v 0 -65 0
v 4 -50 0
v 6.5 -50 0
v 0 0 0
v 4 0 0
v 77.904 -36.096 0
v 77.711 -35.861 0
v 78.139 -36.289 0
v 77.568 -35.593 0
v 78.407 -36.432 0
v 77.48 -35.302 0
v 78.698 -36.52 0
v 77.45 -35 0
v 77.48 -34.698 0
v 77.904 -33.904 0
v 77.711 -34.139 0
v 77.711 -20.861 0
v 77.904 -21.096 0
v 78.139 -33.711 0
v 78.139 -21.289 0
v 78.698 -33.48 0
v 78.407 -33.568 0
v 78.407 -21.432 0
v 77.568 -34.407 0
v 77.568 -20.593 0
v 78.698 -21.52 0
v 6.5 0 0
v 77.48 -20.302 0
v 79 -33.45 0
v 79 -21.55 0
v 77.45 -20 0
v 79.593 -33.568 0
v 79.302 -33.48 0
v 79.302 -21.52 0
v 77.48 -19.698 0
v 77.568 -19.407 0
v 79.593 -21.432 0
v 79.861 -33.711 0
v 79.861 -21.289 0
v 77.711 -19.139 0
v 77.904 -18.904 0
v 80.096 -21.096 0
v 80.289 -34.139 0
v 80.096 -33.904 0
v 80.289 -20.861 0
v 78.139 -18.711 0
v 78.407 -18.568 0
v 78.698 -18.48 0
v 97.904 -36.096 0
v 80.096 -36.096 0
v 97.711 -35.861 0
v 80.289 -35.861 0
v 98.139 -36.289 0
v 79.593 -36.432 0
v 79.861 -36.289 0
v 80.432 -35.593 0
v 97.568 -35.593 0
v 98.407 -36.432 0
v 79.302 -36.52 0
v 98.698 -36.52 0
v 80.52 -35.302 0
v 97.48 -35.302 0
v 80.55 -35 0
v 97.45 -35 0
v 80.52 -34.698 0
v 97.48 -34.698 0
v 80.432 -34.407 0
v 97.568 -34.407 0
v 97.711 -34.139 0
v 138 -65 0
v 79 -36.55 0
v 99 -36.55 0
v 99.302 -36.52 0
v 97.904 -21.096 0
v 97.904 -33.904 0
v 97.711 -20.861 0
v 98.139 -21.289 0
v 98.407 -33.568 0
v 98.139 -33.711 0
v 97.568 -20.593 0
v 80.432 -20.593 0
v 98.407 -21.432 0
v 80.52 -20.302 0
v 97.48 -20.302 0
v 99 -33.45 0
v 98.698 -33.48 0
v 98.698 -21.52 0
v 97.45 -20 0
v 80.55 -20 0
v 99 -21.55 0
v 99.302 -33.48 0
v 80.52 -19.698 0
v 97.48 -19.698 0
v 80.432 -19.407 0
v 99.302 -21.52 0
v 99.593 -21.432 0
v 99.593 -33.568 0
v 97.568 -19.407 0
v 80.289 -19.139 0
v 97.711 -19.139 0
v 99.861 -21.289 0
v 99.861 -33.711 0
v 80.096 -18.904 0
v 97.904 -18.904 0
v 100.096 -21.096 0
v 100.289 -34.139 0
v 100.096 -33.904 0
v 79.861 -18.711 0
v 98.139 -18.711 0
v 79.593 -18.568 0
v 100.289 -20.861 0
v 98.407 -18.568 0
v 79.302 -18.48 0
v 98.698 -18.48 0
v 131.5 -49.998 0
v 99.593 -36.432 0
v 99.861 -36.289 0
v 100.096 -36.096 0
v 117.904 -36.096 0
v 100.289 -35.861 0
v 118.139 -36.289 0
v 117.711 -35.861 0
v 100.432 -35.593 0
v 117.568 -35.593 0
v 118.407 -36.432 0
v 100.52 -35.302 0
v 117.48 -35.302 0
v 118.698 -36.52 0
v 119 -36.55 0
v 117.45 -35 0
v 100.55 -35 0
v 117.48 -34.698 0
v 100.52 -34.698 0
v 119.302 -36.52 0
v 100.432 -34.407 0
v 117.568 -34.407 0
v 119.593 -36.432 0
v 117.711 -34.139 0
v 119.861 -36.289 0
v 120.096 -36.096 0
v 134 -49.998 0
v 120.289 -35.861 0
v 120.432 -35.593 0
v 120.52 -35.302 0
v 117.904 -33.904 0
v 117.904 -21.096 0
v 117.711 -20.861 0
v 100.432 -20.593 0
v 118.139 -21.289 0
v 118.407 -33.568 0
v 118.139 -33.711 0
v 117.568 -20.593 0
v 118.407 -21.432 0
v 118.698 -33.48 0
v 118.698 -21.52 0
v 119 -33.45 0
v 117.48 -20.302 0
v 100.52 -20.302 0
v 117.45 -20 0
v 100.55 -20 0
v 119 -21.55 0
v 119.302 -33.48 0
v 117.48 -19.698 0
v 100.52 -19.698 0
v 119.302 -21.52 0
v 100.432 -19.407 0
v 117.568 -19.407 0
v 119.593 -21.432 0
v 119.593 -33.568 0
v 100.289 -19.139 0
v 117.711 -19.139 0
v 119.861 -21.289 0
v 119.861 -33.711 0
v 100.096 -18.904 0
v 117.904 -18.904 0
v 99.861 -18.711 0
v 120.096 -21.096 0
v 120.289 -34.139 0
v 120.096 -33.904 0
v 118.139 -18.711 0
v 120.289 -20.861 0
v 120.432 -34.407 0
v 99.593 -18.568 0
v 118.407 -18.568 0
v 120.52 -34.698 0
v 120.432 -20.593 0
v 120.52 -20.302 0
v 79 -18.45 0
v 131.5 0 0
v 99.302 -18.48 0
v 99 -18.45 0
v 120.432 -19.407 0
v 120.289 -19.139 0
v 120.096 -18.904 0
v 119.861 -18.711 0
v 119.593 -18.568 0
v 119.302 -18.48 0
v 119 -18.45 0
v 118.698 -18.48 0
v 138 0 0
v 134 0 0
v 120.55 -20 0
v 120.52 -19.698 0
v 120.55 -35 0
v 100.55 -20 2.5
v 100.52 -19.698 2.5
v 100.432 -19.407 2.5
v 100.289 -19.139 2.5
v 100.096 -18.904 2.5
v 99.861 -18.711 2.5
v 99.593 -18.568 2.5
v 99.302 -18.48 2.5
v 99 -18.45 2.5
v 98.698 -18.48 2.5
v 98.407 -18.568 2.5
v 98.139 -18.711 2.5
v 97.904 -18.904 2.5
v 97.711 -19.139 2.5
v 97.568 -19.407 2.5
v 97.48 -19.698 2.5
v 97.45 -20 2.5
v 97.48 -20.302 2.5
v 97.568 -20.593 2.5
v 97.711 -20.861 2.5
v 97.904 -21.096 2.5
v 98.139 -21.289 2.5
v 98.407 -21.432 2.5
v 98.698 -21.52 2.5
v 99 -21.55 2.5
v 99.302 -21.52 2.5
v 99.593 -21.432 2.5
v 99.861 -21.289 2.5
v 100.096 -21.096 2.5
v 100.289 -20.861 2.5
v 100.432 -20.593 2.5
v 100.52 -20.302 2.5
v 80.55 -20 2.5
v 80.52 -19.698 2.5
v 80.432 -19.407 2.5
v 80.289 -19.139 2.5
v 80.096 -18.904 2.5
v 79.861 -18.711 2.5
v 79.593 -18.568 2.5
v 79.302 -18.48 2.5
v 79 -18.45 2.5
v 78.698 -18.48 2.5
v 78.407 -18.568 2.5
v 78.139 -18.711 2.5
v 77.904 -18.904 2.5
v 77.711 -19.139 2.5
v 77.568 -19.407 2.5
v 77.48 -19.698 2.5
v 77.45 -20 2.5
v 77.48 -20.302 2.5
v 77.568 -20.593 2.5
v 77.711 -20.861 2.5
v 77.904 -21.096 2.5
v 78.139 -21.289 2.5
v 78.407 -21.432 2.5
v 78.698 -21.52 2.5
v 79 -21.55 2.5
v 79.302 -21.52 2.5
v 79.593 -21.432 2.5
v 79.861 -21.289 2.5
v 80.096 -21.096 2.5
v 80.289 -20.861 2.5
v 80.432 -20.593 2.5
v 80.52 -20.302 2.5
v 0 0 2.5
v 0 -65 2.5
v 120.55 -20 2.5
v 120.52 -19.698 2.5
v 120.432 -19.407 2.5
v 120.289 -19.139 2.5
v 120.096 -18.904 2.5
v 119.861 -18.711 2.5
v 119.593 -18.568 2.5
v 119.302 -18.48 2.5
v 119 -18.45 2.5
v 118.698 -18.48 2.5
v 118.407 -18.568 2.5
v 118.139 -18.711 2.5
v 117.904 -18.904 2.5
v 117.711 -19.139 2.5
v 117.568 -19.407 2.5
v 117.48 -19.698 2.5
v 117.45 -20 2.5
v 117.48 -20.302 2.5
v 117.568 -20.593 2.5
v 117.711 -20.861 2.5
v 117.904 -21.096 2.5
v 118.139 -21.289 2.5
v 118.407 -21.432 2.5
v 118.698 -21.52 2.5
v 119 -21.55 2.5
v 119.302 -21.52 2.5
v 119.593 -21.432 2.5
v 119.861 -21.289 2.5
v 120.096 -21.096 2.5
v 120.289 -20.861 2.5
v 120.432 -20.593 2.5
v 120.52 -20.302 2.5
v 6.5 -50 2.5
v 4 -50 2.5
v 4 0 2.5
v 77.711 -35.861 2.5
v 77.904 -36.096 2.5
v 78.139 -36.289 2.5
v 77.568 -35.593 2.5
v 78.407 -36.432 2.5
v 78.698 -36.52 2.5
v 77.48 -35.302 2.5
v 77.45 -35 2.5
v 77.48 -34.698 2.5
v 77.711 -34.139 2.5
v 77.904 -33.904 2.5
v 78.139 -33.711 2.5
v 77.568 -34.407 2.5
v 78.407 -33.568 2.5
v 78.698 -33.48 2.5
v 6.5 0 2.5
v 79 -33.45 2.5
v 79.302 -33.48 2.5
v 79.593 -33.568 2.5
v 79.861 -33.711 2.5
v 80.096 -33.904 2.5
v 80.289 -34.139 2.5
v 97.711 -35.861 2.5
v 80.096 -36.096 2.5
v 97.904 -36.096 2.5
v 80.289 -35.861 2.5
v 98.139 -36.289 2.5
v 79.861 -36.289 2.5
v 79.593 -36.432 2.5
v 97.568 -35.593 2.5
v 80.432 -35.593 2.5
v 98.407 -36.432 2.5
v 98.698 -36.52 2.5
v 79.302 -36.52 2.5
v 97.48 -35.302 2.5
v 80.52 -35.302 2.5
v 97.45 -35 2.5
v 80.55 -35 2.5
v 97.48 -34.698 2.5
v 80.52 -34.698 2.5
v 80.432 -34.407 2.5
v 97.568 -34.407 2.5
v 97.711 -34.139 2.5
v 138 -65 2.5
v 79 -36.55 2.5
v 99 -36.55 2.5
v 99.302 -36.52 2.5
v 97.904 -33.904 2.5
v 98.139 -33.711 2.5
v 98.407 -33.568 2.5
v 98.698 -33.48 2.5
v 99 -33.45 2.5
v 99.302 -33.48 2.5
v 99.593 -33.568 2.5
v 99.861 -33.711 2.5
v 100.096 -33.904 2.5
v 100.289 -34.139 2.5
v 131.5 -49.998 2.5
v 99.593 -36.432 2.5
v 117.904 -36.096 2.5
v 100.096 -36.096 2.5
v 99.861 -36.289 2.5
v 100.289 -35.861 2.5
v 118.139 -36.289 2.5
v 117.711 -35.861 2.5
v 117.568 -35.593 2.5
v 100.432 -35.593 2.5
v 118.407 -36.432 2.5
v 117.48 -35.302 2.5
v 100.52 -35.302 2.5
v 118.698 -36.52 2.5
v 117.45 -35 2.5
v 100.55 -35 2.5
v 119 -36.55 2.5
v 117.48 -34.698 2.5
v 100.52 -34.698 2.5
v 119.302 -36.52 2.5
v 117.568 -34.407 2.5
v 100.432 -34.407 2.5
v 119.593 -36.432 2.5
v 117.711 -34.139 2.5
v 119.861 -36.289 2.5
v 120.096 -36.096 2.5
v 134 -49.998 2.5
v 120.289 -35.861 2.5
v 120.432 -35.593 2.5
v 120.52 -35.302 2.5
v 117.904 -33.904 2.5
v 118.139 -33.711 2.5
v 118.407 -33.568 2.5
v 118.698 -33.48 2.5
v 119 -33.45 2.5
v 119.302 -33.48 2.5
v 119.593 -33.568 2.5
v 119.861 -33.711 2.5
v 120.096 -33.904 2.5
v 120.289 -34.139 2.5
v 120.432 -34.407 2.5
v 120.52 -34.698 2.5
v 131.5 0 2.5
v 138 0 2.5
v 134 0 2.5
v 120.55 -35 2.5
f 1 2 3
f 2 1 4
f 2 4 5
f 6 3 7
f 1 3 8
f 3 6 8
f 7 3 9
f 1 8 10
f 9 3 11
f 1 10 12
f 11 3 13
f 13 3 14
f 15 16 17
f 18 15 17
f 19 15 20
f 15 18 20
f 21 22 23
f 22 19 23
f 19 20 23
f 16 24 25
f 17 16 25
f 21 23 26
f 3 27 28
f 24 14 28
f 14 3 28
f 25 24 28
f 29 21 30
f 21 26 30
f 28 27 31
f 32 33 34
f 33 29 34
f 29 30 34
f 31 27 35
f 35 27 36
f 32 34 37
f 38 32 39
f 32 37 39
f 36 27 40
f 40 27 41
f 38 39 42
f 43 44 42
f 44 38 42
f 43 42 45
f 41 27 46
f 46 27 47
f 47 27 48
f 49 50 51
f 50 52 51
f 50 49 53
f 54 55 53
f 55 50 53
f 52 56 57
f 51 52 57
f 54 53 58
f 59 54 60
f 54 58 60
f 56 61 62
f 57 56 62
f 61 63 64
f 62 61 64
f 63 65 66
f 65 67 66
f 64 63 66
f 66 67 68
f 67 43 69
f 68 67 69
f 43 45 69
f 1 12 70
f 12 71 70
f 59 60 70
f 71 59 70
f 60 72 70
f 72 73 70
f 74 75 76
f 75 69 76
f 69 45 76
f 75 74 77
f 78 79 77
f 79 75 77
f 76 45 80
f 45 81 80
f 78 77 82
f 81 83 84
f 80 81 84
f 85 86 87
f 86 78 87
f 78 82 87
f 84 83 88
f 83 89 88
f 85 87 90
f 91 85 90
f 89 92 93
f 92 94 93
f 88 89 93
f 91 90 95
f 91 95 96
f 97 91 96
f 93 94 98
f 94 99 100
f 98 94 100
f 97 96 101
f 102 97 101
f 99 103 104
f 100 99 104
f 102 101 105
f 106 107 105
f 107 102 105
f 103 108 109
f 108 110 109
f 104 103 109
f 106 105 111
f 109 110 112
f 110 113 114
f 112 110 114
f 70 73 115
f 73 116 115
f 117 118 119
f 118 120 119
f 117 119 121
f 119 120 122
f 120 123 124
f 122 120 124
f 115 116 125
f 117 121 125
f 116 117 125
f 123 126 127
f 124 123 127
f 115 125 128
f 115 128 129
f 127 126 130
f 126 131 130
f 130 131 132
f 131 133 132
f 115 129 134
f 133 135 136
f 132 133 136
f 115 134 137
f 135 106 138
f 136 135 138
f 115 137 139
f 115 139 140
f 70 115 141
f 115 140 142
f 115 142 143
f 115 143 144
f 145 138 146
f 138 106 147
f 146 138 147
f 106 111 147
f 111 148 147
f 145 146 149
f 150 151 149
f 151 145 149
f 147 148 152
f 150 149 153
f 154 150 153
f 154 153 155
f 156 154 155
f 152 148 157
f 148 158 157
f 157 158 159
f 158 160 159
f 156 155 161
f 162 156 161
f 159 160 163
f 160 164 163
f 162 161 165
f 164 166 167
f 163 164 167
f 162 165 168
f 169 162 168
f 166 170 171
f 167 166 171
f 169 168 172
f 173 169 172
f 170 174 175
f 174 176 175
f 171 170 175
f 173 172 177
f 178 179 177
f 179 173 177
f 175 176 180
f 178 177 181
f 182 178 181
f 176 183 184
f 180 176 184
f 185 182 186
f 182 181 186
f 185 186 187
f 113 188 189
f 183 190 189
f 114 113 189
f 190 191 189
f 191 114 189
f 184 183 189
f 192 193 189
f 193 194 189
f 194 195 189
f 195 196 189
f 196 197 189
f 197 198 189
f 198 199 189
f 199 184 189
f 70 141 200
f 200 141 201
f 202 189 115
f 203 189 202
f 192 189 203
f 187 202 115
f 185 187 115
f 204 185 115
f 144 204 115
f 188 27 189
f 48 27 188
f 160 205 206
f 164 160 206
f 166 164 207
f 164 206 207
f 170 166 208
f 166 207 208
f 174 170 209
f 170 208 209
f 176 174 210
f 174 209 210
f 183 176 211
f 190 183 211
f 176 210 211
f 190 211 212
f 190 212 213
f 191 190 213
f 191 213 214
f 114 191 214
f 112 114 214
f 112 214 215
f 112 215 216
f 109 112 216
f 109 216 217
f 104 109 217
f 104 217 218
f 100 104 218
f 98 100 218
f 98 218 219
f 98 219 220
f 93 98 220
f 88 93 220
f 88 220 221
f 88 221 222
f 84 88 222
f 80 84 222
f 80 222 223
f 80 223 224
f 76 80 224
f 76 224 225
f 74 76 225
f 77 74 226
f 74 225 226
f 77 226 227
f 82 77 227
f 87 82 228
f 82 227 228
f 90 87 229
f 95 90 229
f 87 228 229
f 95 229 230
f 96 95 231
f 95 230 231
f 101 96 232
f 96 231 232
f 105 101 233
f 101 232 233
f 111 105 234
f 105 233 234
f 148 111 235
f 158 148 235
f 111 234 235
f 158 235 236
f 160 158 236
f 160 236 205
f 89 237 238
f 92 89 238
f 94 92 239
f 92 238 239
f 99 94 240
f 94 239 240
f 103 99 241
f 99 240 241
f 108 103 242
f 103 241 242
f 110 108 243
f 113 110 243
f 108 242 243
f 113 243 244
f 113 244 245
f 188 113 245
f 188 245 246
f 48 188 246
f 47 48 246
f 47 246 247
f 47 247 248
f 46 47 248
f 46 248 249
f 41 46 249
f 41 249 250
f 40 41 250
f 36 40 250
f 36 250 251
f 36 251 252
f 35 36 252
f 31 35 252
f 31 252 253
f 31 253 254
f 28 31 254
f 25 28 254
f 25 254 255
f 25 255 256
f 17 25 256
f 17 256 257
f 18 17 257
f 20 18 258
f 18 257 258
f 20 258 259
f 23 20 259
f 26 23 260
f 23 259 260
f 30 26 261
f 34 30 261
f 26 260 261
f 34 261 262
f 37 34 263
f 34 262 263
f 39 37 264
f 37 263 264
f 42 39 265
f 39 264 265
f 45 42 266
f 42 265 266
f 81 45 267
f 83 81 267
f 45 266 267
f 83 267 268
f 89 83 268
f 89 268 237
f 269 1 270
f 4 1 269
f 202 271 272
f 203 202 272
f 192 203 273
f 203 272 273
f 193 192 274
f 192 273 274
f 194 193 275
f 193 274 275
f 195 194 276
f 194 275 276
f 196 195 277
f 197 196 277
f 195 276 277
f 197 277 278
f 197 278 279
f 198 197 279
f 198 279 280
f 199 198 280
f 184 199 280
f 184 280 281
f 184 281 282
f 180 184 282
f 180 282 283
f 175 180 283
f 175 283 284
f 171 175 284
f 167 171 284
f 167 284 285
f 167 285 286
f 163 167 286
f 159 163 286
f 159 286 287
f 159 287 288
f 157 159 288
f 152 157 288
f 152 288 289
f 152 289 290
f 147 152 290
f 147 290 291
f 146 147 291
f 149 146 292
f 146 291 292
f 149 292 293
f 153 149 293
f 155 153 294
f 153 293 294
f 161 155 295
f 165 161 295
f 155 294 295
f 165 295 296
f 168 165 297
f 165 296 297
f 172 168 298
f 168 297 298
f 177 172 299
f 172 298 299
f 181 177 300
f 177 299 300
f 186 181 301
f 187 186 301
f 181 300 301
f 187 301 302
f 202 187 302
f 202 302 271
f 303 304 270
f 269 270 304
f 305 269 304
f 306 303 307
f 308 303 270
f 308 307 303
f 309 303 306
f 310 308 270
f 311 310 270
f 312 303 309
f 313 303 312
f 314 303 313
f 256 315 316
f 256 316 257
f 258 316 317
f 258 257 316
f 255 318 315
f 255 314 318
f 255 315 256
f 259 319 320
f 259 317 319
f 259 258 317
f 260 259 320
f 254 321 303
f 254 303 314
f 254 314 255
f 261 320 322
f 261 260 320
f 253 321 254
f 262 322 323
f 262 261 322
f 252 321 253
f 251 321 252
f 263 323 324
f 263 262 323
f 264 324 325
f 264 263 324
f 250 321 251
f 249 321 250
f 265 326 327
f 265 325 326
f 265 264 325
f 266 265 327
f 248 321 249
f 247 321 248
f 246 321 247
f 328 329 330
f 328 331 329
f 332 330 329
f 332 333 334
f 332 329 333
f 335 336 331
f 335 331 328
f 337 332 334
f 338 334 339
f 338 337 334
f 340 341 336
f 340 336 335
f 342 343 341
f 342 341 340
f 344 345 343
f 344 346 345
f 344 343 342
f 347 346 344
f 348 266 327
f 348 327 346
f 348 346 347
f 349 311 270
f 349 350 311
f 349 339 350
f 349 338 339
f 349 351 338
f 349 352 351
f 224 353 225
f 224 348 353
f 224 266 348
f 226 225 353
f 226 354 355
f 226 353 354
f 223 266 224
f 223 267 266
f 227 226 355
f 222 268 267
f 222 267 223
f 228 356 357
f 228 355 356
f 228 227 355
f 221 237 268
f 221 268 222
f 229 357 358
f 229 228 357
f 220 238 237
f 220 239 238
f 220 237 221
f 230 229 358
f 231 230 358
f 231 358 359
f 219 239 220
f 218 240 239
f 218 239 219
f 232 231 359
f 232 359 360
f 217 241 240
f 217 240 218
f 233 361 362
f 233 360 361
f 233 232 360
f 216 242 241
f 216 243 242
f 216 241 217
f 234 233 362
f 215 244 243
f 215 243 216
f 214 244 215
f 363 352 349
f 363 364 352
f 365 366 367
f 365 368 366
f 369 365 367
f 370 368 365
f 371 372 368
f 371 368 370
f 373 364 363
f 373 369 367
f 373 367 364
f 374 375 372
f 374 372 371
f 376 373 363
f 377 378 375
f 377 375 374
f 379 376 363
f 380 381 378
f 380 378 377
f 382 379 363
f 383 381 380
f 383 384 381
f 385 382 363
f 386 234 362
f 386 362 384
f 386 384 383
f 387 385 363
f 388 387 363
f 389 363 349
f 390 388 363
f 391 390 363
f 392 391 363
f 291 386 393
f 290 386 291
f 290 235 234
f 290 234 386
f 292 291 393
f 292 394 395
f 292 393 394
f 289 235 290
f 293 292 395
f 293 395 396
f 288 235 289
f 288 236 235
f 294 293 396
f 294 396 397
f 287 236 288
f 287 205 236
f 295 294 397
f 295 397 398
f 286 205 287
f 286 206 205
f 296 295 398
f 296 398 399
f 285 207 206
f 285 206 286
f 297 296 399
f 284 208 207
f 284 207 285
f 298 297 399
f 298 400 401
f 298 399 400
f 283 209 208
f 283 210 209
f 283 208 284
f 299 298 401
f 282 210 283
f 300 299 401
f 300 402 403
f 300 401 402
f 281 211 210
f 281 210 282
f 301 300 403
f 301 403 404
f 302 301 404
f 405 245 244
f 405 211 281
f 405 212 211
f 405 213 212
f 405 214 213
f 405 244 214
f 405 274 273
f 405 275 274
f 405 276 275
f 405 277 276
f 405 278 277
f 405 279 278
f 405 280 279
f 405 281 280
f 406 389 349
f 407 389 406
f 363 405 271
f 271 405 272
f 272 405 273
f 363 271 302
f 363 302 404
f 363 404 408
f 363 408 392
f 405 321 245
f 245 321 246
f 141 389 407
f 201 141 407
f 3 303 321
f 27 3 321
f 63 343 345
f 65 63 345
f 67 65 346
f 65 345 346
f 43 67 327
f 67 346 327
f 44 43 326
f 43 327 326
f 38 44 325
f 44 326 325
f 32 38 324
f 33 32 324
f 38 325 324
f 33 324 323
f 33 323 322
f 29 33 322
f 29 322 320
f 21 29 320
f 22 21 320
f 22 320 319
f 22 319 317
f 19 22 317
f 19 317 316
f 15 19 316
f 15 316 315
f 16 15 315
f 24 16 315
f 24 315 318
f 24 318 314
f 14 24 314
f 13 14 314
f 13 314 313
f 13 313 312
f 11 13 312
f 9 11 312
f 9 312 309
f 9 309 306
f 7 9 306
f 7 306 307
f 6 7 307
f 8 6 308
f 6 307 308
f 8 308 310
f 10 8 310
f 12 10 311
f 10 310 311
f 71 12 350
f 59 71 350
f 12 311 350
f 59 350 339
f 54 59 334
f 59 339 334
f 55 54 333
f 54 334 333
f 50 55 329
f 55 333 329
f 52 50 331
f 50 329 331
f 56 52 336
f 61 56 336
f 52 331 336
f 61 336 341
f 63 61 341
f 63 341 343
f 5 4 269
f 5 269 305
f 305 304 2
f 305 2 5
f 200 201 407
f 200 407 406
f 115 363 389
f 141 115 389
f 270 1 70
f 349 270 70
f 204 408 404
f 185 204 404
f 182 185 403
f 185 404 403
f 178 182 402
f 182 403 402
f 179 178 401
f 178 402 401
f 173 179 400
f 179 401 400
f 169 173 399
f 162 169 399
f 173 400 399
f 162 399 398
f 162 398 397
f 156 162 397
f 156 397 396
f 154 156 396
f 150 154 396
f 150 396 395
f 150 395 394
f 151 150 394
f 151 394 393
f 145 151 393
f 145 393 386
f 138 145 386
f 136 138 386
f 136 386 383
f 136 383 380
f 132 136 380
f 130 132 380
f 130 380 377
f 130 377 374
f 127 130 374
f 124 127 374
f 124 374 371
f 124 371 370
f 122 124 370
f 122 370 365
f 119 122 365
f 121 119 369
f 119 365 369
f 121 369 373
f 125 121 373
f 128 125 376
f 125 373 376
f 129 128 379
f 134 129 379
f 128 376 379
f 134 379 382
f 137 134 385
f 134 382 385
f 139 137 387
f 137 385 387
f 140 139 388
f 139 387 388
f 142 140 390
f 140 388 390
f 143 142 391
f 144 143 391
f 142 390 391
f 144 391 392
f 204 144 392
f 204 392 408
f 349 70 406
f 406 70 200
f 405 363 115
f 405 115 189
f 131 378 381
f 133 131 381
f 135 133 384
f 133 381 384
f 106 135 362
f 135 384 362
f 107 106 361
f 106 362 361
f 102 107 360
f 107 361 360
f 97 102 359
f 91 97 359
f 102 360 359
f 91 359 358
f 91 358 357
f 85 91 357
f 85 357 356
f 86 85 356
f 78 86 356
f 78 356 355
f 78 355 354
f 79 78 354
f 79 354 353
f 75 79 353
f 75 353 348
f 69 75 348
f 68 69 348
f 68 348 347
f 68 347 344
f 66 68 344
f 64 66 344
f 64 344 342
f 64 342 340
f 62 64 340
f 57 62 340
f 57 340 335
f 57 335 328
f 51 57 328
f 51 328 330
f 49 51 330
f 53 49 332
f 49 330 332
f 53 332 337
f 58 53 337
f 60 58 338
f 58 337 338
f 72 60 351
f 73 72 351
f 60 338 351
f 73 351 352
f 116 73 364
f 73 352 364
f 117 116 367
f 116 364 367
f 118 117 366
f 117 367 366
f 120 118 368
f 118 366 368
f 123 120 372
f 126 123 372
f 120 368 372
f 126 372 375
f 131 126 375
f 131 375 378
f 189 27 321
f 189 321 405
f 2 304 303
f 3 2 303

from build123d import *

# Parameters (mm, degrees)
CROQUIS1_W              = 138
CROQUIS1_H              = 65
SALIENTE_EXTRUIR1_DEPTH = 2.5
CROQUIS2_W              = 2.5
CROQUIS2_H              = 50
CORTAR_EXTRUIR1_DEPTH   = 2.5
CROQUIS3_R              = 1.55
CORTAR_EXTRUIR2_DEPTH   = 153.562282364


with BuildPart() as part:
    # Croquis1 → Saliente-Extruir1 (new body)
    with BuildSketch(Plane.XY):
        with Locations((69, -32.5)):
            Rectangle(CROQUIS1_W, CROQUIS1_H)
    extrude(amount=SALIENTE_EXTRUIR1_DEPTH)

    # Croquis2 → Cortar-Extruir1 (cut)
    with BuildSketch(Plane.XY.offset(2.5)):
        with Locations((5.25, -25)):
            Rectangle(CROQUIS2_W, CROQUIS2_H)
        with Locations((132.75, -24.997545264)):
            Rectangle(CROQUIS2_W, CROQUIS2_H)
    extrude(amount=-CORTAR_EXTRUIR1_DEPTH, mode=Mode.SUBTRACT)

    # Croquis3 → Cortar-Extruir2 (cut, through all)
    with BuildSketch(Plane.XY.offset(2.5)):
        with Locations((119, -35)):
            Circle(CROQUIS3_R)
        with Locations((119, -20)):
            Circle(CROQUIS3_R)
        with Locations((99, -35)):
            Circle(CROQUIS3_R)
        with Locations((99, -20)):
            Circle(CROQUIS3_R)
        with Locations((79, -35)):
            Circle(CROQUIS3_R)
        with Locations((79, -20)):
            Circle(CROQUIS3_R)
    extrude(amount=-CORTAR_EXTRUIR2_DEPTH, mode=Mode.SUBTRACT)


solid = part.part
